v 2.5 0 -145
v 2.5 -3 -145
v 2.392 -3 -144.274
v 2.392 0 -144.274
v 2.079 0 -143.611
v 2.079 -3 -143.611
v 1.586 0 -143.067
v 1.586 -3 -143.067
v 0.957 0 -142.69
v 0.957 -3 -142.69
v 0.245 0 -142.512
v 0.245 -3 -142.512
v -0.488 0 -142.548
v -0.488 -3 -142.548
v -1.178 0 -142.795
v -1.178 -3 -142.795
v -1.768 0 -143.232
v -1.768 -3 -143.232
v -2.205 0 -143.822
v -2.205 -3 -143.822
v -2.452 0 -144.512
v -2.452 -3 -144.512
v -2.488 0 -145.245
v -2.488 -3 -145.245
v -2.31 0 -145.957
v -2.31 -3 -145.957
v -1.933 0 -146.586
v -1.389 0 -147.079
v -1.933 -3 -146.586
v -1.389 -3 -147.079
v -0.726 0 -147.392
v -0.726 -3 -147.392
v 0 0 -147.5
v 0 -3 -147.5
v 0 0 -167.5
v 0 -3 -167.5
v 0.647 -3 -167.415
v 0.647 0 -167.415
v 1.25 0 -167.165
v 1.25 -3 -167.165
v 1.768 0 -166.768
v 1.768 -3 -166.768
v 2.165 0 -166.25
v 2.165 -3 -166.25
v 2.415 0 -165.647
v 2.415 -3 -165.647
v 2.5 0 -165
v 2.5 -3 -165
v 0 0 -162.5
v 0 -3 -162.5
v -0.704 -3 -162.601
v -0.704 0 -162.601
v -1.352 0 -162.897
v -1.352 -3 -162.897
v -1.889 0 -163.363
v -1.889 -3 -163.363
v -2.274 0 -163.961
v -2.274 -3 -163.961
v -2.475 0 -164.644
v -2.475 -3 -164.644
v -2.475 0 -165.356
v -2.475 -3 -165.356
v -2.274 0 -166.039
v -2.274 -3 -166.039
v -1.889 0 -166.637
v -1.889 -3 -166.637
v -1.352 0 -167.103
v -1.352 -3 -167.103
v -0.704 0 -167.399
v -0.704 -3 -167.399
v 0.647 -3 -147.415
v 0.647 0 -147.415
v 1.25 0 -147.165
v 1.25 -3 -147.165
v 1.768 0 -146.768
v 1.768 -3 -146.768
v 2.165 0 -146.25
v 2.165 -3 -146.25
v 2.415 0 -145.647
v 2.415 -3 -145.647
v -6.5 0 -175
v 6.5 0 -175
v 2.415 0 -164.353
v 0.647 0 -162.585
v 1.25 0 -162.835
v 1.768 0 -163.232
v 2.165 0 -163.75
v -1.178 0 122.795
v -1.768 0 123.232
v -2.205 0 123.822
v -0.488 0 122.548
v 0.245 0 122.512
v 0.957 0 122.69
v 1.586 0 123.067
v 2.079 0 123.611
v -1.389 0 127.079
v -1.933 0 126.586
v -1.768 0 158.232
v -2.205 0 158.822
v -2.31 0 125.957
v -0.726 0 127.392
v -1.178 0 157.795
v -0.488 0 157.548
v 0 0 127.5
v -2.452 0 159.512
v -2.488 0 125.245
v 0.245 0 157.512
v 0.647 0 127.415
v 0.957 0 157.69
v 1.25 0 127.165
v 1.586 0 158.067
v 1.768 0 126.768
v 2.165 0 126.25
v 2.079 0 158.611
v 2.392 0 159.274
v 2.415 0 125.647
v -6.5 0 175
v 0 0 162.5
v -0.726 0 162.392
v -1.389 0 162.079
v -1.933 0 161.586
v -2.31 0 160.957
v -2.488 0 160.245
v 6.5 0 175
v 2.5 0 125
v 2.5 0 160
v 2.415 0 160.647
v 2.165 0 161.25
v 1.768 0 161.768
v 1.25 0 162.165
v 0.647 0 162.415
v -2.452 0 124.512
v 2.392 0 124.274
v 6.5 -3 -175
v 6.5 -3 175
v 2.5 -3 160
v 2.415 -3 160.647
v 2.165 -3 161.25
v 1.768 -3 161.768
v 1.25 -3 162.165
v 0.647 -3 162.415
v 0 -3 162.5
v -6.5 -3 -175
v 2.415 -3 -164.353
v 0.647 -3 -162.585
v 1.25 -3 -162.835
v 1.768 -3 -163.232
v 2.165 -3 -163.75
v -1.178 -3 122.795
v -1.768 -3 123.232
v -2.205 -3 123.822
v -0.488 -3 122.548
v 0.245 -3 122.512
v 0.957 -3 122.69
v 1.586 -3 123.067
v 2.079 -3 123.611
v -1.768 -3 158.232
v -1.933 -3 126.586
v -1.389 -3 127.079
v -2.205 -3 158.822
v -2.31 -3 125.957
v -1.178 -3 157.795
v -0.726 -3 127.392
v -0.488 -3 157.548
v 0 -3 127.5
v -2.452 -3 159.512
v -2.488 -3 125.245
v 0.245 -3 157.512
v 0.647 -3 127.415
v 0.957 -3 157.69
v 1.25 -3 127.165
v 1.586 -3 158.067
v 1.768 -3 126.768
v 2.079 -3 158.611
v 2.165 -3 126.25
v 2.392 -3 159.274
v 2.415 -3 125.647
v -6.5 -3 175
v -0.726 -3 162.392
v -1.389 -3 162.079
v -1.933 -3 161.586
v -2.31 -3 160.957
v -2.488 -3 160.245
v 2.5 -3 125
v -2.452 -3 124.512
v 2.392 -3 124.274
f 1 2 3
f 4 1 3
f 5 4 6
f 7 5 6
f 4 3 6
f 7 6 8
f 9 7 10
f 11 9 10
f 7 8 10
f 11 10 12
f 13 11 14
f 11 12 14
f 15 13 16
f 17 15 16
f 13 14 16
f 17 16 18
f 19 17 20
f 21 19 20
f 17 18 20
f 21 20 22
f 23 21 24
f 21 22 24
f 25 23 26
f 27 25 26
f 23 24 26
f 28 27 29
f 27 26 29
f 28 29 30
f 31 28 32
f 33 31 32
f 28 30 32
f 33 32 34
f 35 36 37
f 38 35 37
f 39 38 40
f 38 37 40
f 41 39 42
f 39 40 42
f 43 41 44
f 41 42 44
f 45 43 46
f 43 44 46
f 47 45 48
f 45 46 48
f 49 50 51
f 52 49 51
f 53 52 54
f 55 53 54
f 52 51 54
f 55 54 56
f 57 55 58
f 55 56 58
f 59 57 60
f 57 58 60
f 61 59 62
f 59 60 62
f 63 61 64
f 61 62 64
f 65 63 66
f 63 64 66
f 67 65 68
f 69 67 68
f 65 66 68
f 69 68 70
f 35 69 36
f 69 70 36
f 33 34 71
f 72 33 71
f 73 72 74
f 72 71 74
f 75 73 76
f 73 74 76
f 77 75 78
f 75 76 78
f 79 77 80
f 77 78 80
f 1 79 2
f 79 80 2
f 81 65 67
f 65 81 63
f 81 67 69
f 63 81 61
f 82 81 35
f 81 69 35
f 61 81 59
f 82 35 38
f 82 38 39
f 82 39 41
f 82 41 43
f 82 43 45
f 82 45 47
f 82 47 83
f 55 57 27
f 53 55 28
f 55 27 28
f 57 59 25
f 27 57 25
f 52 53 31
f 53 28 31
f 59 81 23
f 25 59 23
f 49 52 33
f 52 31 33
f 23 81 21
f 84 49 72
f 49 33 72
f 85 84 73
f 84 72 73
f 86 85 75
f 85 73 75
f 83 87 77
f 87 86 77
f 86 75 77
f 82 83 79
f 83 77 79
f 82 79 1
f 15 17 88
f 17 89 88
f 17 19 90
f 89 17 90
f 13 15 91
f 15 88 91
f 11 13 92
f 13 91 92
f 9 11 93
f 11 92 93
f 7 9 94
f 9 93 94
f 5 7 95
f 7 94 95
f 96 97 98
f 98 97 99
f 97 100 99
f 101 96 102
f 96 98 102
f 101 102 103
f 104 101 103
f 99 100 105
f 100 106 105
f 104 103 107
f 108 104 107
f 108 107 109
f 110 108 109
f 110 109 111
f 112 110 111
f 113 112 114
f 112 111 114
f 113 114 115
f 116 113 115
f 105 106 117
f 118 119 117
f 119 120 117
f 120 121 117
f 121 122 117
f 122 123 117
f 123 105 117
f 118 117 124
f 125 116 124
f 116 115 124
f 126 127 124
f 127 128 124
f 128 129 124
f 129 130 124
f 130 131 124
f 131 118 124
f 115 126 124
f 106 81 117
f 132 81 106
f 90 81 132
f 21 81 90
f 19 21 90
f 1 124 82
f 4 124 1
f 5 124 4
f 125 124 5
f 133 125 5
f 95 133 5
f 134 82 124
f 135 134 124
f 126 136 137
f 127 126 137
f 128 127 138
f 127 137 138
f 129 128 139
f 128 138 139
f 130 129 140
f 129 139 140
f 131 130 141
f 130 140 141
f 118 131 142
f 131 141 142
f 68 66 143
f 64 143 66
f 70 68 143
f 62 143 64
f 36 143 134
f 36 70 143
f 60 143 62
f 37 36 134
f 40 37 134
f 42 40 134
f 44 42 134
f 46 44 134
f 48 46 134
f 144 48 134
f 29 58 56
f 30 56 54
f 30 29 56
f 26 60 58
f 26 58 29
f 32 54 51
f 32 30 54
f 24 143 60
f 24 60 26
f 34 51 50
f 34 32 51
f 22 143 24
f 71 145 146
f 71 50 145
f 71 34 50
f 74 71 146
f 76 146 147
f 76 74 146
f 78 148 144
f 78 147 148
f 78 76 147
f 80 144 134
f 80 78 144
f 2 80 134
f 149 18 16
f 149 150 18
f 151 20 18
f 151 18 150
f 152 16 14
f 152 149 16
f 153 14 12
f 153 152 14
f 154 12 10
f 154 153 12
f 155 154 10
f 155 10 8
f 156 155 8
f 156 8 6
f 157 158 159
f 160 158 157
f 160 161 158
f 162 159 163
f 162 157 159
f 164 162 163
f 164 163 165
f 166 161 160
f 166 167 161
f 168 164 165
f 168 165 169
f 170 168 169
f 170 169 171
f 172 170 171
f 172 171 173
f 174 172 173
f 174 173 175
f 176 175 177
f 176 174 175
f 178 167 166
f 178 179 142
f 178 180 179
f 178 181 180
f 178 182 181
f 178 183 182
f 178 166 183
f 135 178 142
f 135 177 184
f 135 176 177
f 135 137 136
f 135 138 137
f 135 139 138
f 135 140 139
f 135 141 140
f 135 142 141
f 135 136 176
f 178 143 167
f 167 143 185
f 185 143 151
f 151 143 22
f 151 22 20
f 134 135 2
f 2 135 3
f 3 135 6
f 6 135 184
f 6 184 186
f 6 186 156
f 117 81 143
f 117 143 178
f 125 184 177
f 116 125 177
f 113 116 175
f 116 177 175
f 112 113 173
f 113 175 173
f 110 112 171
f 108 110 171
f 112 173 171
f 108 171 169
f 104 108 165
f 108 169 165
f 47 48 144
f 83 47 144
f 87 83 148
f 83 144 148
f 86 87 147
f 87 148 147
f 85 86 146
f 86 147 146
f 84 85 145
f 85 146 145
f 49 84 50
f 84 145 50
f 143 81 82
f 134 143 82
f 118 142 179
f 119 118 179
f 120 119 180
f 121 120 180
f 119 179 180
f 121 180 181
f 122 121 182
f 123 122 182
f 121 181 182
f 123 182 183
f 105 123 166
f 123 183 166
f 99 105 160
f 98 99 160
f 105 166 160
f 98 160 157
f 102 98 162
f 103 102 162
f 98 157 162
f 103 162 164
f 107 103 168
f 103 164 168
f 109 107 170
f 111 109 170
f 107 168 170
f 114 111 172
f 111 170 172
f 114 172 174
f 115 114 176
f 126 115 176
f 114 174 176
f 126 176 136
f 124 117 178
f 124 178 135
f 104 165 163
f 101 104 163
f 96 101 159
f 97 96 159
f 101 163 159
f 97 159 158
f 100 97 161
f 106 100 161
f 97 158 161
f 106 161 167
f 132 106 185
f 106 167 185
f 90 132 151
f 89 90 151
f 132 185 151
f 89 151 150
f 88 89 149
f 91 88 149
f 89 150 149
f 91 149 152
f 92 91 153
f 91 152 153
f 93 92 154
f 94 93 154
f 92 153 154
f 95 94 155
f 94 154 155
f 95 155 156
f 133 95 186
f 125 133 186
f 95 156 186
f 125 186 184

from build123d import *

# Parameters (mm, degrees)
F0_W     = 13
F0_H     = 350
F1_DEPTH = 3
F3_DEPTH = 3
F5_DEPTH = 25
F7_DEPTH = 25
F8_DEPTH = 25


with BuildPart() as f1:
    # F0 (on Front) → F1 (new body)
    with BuildSketch(Plane.XZ):
        Rectangle(F0_W, F0_H)
    extrude(amount=F1_DEPTH)

    # F2 (on face) → F3 (cut)
    with BuildSketch(Plane.XZ.offset(3)):
        with BuildLine():
            ThreePointArc((2.5, 160), (1.767766953, 161.767766953), (0, 162.5))
            ThreePointArc((0, 162.5), (-1.767766953, 158.232233047), (2.5, 160))
        make_face()
    extrude(amount=-F3_DEPTH, mode=Mode.SUBTRACT)

    # F4 (on face) → F5 (cut)
    with BuildSketch(Plane.XZ.offset(3)):
        with BuildLine():
            ThreePointArc((2.5, -145), (-1.767766953, -143.232233047), (0, -147.5))
            ThreePointArc((0, -147.5), (1.767766953, -146.767766953), (2.5, -145))
        make_face()
    extrude(amount=-F5_DEPTH, mode=Mode.SUBTRACT)

    # F6 (on face) → F7 (cut)
    with BuildSketch(Plane.XZ.offset(3)):
        with BuildLine():
            ThreePointArc((2.5, 125), (1.767766953, 126.767766953), (0, 127.5))
            ThreePointArc((0, 127.5), (-1.767766953, 123.232233047), (2.5, 125))
        make_face()
    extrude(amount=-F7_DEPTH, mode=Mode.SUBTRACT)

    # F4 (on face) → F8 (cut)
    with BuildSketch(Plane.XZ.offset(3)):
        with BuildLine():
            ThreePointArc((0, -162.5), (-2.5, -165), (0, -167.5))
            Line((0, -167.5), (0, -165))
            Line((0, -165), (0, -162.5))
        make_face()
        with BuildLine():
            ThreePointArc((2.5, -145), (-1.767766953, -143.232233047), (0, -147.5))
            ThreePointArc((0, -147.5), (1.767766953, -146.767766953), (2.5, -145))
        make_face()
        with BuildLine():
            Line((0, -165), (0, -167.5))
            ThreePointArc((0, -167.5), (1.767766953, -166.767766953), (2.5, -165))
            ThreePointArc((2.5, -165), (1.767766953, -163.232233047), (0, -162.5))
            Line((0, -162.5), (0, -165))
        make_face()
    extrude(amount=-F8_DEPTH, mode=Mode.SUBTRACT)


solid = f1.part
